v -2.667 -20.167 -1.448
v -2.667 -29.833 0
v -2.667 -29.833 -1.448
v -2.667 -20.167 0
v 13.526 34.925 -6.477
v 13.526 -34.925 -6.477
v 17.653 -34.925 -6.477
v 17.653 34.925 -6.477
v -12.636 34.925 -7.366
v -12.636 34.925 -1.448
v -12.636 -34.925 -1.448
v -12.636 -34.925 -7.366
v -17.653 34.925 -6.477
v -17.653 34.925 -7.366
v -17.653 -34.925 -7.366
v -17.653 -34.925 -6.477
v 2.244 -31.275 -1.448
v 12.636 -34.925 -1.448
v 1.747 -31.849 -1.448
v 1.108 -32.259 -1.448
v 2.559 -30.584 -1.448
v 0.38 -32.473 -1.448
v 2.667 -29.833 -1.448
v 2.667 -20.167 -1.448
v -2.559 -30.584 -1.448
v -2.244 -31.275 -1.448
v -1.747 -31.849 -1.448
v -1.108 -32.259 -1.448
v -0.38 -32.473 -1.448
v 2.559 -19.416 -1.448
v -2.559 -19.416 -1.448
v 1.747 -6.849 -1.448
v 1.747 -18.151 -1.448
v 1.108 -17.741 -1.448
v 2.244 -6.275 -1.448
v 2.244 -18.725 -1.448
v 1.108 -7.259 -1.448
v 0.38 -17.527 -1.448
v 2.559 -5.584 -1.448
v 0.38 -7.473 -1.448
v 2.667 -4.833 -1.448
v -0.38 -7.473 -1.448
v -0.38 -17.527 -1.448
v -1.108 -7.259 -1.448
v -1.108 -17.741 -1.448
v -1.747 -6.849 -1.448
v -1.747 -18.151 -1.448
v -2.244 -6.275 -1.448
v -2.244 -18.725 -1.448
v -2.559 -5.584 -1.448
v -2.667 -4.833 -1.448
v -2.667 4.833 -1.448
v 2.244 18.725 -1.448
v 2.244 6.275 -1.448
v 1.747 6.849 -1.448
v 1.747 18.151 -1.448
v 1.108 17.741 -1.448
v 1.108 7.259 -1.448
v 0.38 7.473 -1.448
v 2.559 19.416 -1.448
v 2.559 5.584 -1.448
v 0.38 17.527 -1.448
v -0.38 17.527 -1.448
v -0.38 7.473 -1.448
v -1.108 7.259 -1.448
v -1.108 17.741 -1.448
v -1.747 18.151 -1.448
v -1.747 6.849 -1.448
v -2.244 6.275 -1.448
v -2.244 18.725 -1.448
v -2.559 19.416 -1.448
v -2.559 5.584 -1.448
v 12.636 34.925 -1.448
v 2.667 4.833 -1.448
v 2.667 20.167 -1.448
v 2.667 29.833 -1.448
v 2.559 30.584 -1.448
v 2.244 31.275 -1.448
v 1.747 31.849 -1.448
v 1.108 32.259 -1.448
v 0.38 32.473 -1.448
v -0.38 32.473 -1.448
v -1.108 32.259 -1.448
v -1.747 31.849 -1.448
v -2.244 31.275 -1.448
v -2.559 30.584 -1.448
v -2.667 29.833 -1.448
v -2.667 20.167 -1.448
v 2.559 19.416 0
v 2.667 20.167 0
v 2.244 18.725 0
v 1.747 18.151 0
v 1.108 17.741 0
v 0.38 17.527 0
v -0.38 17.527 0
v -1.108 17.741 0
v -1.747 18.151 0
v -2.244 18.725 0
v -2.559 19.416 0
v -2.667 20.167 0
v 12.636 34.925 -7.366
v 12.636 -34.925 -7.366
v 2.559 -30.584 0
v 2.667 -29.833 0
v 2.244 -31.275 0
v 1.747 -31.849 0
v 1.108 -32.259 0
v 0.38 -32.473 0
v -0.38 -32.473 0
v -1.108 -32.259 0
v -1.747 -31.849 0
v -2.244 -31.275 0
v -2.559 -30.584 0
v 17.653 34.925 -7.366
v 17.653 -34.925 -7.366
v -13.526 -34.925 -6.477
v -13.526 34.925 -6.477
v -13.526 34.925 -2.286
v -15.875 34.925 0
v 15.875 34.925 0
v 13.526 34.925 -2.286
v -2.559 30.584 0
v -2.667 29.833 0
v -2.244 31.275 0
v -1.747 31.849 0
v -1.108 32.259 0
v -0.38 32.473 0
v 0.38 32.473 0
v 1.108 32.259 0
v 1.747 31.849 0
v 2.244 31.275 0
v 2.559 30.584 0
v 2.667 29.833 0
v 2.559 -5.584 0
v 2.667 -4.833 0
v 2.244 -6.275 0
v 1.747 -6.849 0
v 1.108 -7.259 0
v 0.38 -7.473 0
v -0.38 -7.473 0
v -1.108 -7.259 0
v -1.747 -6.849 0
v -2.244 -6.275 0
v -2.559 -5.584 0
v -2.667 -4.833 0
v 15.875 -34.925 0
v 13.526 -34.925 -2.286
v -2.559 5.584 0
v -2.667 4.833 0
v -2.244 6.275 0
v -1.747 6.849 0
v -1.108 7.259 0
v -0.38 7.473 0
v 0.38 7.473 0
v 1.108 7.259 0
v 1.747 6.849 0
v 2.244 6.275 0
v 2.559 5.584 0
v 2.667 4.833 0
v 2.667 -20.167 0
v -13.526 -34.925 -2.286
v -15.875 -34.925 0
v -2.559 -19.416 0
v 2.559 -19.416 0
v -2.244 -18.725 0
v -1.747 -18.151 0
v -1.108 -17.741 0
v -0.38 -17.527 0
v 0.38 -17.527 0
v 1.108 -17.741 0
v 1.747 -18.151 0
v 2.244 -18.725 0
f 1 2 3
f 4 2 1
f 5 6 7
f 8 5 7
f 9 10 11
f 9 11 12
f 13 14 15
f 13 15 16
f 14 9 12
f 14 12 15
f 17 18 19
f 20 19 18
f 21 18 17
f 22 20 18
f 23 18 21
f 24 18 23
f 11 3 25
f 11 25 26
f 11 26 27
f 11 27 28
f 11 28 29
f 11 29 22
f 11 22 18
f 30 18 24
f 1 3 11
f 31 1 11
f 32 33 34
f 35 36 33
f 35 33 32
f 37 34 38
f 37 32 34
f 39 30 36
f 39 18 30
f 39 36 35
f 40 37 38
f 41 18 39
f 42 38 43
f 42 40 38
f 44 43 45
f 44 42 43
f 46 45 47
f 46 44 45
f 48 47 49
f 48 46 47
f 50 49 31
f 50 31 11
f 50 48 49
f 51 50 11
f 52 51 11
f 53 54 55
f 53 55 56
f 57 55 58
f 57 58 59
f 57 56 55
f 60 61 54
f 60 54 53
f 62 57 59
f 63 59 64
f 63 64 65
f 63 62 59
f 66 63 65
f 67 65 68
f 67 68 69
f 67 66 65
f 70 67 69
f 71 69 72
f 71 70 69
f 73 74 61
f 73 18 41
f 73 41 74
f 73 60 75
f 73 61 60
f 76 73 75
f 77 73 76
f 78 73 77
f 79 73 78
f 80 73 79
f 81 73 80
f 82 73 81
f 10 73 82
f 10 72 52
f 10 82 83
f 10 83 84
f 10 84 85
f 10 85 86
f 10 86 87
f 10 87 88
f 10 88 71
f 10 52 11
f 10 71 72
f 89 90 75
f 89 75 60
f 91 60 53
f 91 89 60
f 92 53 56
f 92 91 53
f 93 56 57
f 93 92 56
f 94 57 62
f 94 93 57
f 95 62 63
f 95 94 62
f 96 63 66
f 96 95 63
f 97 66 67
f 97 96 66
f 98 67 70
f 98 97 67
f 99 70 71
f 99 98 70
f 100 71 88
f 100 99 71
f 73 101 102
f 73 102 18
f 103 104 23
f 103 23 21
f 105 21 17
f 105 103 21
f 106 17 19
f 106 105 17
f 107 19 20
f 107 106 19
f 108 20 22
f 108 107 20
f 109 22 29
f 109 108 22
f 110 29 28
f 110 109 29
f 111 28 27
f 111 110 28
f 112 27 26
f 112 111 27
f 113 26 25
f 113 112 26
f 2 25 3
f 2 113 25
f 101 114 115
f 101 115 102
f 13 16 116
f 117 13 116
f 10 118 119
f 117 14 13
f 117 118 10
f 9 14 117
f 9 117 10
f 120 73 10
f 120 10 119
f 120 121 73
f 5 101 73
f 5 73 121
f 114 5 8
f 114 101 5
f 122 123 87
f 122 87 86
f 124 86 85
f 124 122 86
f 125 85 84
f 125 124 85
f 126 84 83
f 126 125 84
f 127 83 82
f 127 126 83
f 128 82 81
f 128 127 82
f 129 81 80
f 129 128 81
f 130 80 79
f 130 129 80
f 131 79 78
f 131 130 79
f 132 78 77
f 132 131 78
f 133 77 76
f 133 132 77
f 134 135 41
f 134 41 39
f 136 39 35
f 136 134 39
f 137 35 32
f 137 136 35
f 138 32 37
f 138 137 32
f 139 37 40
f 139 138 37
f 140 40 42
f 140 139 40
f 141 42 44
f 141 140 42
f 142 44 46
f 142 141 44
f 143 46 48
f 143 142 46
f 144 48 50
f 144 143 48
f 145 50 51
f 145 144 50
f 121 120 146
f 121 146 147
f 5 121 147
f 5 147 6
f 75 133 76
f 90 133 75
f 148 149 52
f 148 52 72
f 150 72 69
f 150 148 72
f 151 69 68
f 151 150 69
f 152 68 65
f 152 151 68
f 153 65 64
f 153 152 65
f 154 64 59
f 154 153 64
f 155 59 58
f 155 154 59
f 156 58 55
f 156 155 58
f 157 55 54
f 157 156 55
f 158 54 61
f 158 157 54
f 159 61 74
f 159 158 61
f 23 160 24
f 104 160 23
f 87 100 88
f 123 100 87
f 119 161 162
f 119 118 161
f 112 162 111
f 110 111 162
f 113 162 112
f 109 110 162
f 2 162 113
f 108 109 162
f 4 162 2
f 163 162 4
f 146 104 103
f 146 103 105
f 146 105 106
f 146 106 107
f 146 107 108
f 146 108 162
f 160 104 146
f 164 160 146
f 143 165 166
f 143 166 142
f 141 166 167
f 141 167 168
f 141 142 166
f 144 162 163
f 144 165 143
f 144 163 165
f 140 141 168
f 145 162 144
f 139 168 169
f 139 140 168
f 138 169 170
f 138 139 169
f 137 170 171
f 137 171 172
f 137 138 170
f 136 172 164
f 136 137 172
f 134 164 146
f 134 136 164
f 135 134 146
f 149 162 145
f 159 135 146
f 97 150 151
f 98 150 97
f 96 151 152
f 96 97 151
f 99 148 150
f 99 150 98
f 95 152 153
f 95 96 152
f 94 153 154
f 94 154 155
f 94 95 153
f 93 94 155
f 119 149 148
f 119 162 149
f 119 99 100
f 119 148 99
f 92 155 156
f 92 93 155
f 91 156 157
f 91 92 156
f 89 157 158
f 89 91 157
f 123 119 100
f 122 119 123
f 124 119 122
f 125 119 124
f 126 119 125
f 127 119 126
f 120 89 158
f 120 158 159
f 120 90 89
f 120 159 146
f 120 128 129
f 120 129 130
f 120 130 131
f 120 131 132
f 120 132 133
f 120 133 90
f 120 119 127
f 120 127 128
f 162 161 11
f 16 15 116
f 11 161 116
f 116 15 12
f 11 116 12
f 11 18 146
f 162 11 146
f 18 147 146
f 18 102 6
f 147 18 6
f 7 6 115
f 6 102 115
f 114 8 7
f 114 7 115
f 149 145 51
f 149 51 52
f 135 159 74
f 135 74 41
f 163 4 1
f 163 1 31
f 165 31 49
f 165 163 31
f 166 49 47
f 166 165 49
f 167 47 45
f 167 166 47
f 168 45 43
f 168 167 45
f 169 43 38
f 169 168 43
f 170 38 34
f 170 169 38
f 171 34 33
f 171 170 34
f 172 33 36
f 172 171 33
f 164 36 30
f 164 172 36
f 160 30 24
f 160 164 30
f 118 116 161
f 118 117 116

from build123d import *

# Parameters (mm, degrees)
BOSS_EXTRUDE1_DEPTH = 34.925
CUT_EXTRUDE1_DEPTH  = 40.820120417
LPATTERN1_COUNT     = 2
LPATTERN1_PITCH     = 25
LPATTERN1_COL_COUNT = 2
LPATTERN1_COL_PITCH = 25


with BuildPart() as part:
    # Sketch1 → Boss-Extrude1 (new, symmetric)
    with BuildSketch(Plane(origin=(0, 0, 0), x_dir=(1, 0, 0), z_dir=(0, 1, 0))):
        Polygon((-15.875, 0), (0, 0), (0, 1.4478), (-12.6365, 1.4478), (-12.6365, 7.366), (-17.653, 7.366), (-17.653, 6.477), (-13.5255, 6.477), (-13.5255, 2.286), align=None)
        Polygon((0, 1.4478), (0, 0), (15.875, 0), (13.5255, 2.286), (13.5255, 6.477), (17.653, 6.477), (17.653, 7.366), (12.6365, 7.366), (12.6365, 1.4478), align=None)
    extrude(amount=BOSS_EXTRUDE1_DEPTH, both=True)

    # Sketch2 → Cut-Extrude1 (cut, through all)
    with BuildSketch(Plane.XY):
        with BuildLine():
            Line((-2.667, -4.833), (-2.667, 4.833))
            ThreePointArc((-2.667, 4.833), (0, 7.5), (2.667, 4.833))
            Line((2.667, 4.833), (2.667, -4.833))
            ThreePointArc((2.667, -4.833), (0, -7.5), (-2.667, -4.833))
        make_face()
    cut_extrude1 = extrude(amount=-CUT_EXTRUDE1_DEPTH, mode=Mode.SUBTRACT)

    # LPattern1: Cut-Extrude1 ×2
    with Locations(*[(0, -i * LPATTERN1_PITCH, 0) for i in range(1, LPATTERN1_COUNT)]):
        add(cut_extrude1, mode=Mode.SUBTRACT)

    # LPattern1 col: Cut-Extrude1 ×2
    with Locations(*[(0, i * LPATTERN1_COL_PITCH, 0) for i in range(1, LPATTERN1_COL_COUNT)]):
        add(cut_extrude1, mode=Mode.SUBTRACT)


solid = part.part
